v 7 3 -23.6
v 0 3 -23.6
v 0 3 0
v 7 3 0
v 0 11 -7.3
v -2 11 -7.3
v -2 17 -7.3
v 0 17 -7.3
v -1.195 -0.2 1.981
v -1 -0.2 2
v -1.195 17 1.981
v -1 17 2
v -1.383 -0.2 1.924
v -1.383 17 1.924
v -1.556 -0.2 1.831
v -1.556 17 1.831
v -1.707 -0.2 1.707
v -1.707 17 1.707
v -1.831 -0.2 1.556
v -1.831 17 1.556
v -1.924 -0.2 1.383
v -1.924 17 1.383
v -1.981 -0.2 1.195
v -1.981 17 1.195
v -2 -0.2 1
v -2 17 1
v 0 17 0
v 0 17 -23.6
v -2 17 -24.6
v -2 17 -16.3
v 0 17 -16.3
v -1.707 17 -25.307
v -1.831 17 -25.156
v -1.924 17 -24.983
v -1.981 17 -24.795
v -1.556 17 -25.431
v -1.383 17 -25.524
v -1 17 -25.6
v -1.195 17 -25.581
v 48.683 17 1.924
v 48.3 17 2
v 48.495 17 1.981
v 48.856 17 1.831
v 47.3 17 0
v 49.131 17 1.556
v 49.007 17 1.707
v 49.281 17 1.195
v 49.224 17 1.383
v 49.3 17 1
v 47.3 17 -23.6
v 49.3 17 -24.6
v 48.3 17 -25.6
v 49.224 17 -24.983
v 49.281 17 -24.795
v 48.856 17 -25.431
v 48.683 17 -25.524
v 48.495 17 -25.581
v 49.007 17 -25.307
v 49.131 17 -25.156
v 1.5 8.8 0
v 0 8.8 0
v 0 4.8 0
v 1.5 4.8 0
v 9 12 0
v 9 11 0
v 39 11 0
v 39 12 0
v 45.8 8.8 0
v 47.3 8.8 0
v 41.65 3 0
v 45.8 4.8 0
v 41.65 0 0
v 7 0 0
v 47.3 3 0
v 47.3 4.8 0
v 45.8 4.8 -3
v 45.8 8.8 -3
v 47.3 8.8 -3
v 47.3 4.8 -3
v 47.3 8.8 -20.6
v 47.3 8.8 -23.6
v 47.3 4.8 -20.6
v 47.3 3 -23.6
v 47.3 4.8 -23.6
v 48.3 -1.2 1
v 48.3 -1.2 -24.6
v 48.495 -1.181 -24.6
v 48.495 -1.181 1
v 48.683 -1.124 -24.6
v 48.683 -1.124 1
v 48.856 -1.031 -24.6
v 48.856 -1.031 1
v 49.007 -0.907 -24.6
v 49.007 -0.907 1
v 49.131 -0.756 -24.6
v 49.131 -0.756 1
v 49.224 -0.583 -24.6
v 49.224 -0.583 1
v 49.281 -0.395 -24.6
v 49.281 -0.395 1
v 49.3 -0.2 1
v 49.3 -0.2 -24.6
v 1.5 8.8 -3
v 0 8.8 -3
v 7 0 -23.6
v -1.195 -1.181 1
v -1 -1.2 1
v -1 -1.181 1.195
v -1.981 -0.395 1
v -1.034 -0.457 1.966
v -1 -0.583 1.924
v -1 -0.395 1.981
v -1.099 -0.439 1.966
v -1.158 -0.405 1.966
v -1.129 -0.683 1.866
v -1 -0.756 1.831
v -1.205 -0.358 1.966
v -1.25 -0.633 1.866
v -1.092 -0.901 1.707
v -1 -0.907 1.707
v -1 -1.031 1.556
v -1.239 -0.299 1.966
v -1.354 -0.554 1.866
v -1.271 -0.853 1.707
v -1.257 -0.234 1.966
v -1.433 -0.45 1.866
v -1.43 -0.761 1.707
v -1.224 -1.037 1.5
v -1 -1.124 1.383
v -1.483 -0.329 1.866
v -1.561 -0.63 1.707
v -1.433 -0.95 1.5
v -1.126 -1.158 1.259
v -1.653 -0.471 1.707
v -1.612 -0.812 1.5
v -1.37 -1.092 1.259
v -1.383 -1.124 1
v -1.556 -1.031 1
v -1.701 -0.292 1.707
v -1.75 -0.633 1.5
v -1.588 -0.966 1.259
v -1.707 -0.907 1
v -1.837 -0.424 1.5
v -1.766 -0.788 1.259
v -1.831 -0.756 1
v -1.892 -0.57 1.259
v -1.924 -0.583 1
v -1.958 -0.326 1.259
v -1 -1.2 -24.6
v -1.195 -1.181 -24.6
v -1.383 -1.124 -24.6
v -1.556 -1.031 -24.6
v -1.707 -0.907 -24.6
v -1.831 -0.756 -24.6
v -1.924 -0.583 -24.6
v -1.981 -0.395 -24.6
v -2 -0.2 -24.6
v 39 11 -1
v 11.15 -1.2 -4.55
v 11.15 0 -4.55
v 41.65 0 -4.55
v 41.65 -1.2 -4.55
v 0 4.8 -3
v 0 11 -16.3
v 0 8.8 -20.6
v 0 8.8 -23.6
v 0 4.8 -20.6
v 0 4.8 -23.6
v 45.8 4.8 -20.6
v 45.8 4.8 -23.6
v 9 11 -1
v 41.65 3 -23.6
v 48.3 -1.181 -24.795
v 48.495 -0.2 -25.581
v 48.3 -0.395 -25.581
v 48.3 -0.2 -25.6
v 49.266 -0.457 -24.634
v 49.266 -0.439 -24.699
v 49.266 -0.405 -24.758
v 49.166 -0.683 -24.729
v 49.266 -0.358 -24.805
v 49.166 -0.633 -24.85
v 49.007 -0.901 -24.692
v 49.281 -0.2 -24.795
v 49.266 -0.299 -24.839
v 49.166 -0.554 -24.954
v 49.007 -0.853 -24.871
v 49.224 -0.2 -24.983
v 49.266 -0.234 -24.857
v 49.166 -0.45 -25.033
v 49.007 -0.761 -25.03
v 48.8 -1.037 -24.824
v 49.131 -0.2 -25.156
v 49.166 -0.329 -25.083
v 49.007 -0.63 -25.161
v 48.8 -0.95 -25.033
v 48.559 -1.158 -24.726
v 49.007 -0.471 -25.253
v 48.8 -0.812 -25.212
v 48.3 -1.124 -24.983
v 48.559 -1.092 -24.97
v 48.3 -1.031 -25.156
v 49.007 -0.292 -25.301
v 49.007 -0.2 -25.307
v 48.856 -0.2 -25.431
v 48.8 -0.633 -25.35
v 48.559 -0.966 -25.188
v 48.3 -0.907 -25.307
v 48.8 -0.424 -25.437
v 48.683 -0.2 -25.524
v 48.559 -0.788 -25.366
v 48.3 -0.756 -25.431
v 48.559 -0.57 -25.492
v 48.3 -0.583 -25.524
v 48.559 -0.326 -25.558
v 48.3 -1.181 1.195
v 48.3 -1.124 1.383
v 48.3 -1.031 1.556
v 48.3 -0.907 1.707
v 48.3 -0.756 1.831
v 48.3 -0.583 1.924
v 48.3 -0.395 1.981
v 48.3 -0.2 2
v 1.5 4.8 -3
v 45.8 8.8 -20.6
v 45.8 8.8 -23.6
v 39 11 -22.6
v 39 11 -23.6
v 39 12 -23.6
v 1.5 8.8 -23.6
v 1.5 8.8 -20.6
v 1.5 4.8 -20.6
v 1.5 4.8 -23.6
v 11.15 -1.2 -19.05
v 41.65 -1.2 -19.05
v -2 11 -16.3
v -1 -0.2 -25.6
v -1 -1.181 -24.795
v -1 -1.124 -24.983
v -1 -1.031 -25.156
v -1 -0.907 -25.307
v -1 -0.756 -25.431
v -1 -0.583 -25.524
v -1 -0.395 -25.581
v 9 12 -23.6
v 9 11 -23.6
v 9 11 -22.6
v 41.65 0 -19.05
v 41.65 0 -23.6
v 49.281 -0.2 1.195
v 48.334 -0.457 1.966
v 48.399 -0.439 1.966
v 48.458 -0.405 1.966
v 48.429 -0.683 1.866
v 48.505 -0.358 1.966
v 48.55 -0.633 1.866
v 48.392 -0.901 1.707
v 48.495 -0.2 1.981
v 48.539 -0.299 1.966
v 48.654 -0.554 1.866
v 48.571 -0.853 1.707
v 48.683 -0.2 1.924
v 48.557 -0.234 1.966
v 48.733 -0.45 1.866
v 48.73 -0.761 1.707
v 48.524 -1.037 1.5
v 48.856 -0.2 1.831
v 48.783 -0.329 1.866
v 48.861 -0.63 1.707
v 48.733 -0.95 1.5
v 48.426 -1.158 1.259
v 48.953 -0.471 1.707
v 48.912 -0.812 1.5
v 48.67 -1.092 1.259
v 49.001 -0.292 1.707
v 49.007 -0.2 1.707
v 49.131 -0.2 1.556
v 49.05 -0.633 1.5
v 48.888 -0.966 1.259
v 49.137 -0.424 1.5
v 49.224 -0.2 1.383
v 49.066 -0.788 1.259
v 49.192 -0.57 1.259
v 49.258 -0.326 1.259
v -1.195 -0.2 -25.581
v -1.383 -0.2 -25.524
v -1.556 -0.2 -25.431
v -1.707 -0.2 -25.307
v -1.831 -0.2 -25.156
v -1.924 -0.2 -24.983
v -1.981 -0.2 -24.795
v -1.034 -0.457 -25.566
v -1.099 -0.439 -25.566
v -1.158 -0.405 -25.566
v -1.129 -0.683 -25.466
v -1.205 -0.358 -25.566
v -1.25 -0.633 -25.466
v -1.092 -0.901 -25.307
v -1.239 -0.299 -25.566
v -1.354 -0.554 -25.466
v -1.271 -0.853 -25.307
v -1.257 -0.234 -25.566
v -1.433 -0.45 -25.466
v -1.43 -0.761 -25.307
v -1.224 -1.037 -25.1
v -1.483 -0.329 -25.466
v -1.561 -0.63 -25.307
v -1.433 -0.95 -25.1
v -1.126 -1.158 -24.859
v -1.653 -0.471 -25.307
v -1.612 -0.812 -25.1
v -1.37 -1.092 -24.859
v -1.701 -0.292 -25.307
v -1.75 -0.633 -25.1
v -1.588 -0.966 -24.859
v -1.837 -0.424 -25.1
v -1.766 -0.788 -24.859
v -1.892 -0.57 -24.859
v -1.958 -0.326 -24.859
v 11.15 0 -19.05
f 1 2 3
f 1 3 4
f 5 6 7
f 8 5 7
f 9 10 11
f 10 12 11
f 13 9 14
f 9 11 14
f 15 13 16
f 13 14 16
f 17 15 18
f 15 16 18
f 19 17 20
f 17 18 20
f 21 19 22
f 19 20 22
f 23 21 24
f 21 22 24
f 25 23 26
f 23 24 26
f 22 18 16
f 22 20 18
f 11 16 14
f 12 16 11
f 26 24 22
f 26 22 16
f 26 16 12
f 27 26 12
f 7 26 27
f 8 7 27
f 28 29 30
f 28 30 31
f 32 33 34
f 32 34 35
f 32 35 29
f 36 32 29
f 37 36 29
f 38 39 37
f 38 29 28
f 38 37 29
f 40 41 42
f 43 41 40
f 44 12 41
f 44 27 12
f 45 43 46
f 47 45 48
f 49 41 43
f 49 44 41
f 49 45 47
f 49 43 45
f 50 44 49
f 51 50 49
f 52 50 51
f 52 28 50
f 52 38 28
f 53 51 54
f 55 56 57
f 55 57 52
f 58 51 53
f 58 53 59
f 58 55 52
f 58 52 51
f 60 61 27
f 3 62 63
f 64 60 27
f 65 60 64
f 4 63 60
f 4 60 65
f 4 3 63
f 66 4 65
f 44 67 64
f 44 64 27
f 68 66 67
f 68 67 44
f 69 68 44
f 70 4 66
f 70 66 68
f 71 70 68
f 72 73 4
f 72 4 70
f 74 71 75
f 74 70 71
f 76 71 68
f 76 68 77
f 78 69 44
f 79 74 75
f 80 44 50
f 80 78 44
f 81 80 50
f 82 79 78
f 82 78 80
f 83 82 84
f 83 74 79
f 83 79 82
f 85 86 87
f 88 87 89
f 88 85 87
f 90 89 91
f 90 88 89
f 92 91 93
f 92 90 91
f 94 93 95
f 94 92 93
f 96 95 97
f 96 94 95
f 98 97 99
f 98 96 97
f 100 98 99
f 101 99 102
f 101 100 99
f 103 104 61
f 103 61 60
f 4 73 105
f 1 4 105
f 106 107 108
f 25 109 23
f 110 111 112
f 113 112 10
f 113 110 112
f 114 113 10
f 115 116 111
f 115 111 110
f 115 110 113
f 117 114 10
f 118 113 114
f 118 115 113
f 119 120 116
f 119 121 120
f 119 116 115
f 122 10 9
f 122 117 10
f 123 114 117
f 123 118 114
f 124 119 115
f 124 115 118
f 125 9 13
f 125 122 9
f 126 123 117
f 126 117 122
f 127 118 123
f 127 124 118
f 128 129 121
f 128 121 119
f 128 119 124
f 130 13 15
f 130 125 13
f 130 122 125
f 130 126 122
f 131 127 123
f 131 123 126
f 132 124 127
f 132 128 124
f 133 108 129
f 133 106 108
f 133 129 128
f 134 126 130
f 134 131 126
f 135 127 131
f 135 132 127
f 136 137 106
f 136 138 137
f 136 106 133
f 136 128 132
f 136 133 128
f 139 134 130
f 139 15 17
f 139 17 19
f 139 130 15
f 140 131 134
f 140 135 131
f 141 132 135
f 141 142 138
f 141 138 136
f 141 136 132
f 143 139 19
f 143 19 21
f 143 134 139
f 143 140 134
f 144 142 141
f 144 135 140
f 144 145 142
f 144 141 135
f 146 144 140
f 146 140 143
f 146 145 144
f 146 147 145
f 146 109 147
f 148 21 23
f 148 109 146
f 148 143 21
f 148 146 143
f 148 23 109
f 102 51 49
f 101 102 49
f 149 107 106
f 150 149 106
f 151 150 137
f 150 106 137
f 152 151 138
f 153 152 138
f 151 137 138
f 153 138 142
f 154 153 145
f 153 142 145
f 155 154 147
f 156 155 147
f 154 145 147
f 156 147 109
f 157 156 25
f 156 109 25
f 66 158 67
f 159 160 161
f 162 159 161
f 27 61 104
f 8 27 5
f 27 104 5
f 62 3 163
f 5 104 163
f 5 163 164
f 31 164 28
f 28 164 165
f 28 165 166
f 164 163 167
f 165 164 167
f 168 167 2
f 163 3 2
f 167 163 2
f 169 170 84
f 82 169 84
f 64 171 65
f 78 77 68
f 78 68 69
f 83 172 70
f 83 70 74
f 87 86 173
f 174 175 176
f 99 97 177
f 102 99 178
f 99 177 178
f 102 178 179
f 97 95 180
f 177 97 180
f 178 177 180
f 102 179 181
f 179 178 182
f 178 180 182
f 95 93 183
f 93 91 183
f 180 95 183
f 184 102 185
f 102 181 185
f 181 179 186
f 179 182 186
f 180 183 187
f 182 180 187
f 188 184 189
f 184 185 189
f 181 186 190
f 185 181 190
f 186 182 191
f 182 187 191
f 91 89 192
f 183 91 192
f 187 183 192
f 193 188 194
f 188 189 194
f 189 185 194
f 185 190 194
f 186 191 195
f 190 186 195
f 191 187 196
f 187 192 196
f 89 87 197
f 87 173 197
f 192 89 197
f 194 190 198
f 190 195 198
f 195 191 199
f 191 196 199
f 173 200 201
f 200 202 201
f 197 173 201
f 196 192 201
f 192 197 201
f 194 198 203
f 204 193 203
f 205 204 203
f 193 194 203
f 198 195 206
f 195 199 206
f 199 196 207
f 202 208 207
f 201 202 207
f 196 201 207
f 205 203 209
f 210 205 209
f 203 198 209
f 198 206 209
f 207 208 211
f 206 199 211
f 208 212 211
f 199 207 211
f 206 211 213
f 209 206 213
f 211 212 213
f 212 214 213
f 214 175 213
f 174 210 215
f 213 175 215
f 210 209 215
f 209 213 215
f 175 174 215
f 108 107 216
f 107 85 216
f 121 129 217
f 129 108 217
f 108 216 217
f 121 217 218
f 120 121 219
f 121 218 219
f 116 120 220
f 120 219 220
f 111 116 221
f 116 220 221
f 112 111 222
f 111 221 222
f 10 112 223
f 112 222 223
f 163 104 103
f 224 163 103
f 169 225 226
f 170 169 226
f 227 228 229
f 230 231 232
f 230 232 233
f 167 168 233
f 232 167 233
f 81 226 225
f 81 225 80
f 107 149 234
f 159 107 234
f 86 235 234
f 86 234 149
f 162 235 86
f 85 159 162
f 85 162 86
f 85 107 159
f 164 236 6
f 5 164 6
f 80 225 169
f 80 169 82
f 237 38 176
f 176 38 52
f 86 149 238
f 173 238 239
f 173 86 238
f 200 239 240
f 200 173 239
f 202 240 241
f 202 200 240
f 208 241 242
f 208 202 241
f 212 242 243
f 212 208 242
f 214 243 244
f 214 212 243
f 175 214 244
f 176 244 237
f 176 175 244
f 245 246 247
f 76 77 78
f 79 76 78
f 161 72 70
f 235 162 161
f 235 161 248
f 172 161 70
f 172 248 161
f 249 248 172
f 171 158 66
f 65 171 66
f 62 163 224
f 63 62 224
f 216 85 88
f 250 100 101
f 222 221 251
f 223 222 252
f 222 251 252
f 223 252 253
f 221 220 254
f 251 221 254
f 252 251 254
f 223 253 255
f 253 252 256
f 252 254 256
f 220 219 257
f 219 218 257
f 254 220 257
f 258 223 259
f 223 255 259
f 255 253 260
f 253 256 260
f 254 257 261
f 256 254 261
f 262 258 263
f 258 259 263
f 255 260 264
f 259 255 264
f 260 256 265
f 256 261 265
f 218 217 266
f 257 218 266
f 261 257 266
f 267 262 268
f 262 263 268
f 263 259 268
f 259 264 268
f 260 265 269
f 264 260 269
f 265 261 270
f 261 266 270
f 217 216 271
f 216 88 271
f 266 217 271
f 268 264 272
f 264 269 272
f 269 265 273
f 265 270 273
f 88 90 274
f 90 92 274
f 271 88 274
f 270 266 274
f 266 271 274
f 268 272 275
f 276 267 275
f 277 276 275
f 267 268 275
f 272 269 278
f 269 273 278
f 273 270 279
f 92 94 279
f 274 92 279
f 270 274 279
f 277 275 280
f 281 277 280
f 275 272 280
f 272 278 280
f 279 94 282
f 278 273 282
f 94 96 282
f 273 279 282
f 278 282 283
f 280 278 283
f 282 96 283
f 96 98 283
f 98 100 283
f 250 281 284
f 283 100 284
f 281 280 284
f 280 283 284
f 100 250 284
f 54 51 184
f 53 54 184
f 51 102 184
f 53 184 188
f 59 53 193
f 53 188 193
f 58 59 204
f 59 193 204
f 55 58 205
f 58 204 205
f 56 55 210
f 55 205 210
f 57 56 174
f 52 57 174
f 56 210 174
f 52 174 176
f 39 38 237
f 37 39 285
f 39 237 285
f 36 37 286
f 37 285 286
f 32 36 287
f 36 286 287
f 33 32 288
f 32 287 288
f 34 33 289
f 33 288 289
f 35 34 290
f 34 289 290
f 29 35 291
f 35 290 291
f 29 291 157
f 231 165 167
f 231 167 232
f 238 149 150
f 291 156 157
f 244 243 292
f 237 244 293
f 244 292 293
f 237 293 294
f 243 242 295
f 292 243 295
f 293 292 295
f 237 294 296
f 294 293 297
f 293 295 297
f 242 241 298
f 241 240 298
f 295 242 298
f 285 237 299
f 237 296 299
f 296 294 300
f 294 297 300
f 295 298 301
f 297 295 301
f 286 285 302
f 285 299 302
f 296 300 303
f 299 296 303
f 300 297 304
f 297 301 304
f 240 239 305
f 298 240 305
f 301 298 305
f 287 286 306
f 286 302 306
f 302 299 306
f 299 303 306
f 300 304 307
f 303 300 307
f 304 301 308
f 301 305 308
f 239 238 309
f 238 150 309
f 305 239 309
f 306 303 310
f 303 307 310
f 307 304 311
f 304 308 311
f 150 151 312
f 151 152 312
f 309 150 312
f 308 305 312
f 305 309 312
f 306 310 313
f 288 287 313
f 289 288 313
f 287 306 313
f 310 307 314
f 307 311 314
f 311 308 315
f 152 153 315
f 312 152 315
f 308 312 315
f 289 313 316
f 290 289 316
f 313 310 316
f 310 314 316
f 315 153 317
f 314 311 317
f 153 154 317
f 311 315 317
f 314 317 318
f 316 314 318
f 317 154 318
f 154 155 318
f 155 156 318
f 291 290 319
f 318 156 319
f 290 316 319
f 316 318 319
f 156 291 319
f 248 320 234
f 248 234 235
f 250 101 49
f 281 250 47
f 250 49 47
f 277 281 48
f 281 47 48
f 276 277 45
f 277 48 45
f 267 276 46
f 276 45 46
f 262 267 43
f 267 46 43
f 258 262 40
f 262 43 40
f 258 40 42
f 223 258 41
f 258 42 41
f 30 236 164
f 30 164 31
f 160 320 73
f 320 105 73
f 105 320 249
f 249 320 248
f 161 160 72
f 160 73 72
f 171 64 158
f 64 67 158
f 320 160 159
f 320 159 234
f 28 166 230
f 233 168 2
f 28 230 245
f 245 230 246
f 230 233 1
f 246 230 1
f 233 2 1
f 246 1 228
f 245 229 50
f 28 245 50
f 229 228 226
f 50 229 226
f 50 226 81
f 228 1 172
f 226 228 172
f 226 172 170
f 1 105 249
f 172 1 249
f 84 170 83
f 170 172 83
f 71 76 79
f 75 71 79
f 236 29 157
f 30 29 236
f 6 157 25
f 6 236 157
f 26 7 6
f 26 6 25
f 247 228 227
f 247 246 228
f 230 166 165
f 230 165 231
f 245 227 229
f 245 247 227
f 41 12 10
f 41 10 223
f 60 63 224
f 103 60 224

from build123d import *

# Parameters (mm, degrees)
SKETCH1_W                = 51.3
SKETCH1_H                = 27.6
SKETCH1_W_2              = 47.3
SKETCH1_H_2              = 23.6
EXTRUDE_THIN1_DEPTH      = 17
SKETCH2_W                = 51.3
SKETCH2_H                = 27.6
BOSS_EXTRUDE1_DEPTH      = 1.2
SKETCH3_W                = 30.5
SKETCH3_H                = 14.5
CUT_EXTRUDE1_DEPTH       = 10
SKETCH7_W                = 7
SKETCH7_H                = 23.6
SKETCH7_W_2              = 5.65
BOSS_EXTRUDE2_DEPTH      = 3
BOSS_EXTRUDE3_DEPTH      = 15
BOSS_EXTRUDE3_DEPTH_BACK = 15
FILLET1_R                = 1
SKETCH12_W               = 9
SKETCH12_H               = 12
CUT_EXTRUDE3_DEPTH       = 10
SKETCH14_W               = 1.5
SKETCH14_H               = 3
BOSS_EXTRUDE4_DEPTH      = 4


with BuildPart() as part:
    # Sketch1 → Extrude-Thin1 (new body)
    with BuildSketch(Plane(origin=(0, 0, 0), x_dir=(1, 0, 0), z_dir=(0, 1, 0))):
        with Locations((23.65, 11.8)):
            Rectangle(SKETCH1_W, SKETCH1_H)
        with Locations((23.65, 11.8)):
            Rectangle(SKETCH1_W_2, SKETCH1_H_2, mode=Mode.SUBTRACT)
    extrude(amount=EXTRUDE_THIN1_DEPTH)

    # Sketch2 → Boss-Extrude1 (add)
    with BuildSketch(Plane.XZ):
        with Locations((23.65, -11.8)):
            Rectangle(SKETCH2_W, SKETCH2_H)
    extrude(amount=BOSS_EXTRUDE1_DEPTH)

    # Sketch3 → Cut-Extrude1 (cut)
    with BuildSketch(Plane(origin=(0, 0, 0), x_dir=(1, 0, 0), z_dir=(0, 1, 0))):
        with Locations((26.4, 11.8)):
            Rectangle(SKETCH3_W, SKETCH3_H)
    extrude(amount=-CUT_EXTRUDE1_DEPTH, mode=Mode.SUBTRACT)

    # Sketch7 → Boss-Extrude2 (add)
    with BuildSketch(Plane(origin=(0, 0, 0), x_dir=(1, 0, 0), z_dir=(0, 1, 0))):
        with Locations((3.5, 11.8)):
            Rectangle(SKETCH7_W, SKETCH7_H)
        with Locations((44.475, 11.8)):
            Rectangle(SKETCH7_W_2, SKETCH7_H)
    extrude(amount=BOSS_EXTRUDE2_DEPTH)

    # Sketch9 → Boss-Extrude3 (add, two sides)
    with BuildSketch(Plane.ZY.offset(-24)) as boss_extrude3_sk:
        Polygon((-22.6, 11), (-23.6, 12), (-23.6, 11), align=None)
        Polygon((0, 12), (-1, 11), (0, 11), align=None)
    extrude(amount=BOSS_EXTRUDE3_DEPTH)
    extrude(boss_extrude3_sk.sketch, amount=-BOSS_EXTRUDE3_DEPTH_BACK)

    # Fillet1
    fillet1_edges = [part.edges().sort_by_distance(p)[0] for p in [
        (-2, -1.2, -11.8),
        (23.65, -1.2, -25.6),
        (49.3, -1.2, -11.8),
        (23.65, -1.2, 2),
        (-2, 7.9, -25.6),
        (49.3, 7.9, -25.6),
        (49.3, 7.9, 2),
        (-2, 7.9, 2),
    ]]
    fillet(fillet1_edges, radius=FILLET1_R)

    # Sketch12 → Cut-Extrude3 (cut)
    with BuildSketch(Plane.ZY.offset(2)):
        with Locations((-11.8, 17)):
            Rectangle(SKETCH12_W, SKETCH12_H)
    extrude(amount=-CUT_EXTRUDE3_DEPTH, mode=Mode.SUBTRACT)

    # Sketch14 → Boss-Extrude4 (add)
    with BuildSketch(Plane(origin=(0, 4.8, 0), x_dir=(1, 0, 0), z_dir=(0, 1, 0))):
        with Locations((0.75, 22.1)):
            Rectangle(SKETCH14_W, SKETCH14_H)
        with Locations((46.55, 22.1)):
            Rectangle(SKETCH14_W, SKETCH14_H)
        with Locations((46.55, 1.5)):
            Rectangle(SKETCH14_W, SKETCH14_H)
        with Locations((0.75, 1.5)):
            Rectangle(SKETCH14_W, SKETCH14_H)
    extrude(amount=BOSS_EXTRUDE4_DEPTH)


solid = part.part
